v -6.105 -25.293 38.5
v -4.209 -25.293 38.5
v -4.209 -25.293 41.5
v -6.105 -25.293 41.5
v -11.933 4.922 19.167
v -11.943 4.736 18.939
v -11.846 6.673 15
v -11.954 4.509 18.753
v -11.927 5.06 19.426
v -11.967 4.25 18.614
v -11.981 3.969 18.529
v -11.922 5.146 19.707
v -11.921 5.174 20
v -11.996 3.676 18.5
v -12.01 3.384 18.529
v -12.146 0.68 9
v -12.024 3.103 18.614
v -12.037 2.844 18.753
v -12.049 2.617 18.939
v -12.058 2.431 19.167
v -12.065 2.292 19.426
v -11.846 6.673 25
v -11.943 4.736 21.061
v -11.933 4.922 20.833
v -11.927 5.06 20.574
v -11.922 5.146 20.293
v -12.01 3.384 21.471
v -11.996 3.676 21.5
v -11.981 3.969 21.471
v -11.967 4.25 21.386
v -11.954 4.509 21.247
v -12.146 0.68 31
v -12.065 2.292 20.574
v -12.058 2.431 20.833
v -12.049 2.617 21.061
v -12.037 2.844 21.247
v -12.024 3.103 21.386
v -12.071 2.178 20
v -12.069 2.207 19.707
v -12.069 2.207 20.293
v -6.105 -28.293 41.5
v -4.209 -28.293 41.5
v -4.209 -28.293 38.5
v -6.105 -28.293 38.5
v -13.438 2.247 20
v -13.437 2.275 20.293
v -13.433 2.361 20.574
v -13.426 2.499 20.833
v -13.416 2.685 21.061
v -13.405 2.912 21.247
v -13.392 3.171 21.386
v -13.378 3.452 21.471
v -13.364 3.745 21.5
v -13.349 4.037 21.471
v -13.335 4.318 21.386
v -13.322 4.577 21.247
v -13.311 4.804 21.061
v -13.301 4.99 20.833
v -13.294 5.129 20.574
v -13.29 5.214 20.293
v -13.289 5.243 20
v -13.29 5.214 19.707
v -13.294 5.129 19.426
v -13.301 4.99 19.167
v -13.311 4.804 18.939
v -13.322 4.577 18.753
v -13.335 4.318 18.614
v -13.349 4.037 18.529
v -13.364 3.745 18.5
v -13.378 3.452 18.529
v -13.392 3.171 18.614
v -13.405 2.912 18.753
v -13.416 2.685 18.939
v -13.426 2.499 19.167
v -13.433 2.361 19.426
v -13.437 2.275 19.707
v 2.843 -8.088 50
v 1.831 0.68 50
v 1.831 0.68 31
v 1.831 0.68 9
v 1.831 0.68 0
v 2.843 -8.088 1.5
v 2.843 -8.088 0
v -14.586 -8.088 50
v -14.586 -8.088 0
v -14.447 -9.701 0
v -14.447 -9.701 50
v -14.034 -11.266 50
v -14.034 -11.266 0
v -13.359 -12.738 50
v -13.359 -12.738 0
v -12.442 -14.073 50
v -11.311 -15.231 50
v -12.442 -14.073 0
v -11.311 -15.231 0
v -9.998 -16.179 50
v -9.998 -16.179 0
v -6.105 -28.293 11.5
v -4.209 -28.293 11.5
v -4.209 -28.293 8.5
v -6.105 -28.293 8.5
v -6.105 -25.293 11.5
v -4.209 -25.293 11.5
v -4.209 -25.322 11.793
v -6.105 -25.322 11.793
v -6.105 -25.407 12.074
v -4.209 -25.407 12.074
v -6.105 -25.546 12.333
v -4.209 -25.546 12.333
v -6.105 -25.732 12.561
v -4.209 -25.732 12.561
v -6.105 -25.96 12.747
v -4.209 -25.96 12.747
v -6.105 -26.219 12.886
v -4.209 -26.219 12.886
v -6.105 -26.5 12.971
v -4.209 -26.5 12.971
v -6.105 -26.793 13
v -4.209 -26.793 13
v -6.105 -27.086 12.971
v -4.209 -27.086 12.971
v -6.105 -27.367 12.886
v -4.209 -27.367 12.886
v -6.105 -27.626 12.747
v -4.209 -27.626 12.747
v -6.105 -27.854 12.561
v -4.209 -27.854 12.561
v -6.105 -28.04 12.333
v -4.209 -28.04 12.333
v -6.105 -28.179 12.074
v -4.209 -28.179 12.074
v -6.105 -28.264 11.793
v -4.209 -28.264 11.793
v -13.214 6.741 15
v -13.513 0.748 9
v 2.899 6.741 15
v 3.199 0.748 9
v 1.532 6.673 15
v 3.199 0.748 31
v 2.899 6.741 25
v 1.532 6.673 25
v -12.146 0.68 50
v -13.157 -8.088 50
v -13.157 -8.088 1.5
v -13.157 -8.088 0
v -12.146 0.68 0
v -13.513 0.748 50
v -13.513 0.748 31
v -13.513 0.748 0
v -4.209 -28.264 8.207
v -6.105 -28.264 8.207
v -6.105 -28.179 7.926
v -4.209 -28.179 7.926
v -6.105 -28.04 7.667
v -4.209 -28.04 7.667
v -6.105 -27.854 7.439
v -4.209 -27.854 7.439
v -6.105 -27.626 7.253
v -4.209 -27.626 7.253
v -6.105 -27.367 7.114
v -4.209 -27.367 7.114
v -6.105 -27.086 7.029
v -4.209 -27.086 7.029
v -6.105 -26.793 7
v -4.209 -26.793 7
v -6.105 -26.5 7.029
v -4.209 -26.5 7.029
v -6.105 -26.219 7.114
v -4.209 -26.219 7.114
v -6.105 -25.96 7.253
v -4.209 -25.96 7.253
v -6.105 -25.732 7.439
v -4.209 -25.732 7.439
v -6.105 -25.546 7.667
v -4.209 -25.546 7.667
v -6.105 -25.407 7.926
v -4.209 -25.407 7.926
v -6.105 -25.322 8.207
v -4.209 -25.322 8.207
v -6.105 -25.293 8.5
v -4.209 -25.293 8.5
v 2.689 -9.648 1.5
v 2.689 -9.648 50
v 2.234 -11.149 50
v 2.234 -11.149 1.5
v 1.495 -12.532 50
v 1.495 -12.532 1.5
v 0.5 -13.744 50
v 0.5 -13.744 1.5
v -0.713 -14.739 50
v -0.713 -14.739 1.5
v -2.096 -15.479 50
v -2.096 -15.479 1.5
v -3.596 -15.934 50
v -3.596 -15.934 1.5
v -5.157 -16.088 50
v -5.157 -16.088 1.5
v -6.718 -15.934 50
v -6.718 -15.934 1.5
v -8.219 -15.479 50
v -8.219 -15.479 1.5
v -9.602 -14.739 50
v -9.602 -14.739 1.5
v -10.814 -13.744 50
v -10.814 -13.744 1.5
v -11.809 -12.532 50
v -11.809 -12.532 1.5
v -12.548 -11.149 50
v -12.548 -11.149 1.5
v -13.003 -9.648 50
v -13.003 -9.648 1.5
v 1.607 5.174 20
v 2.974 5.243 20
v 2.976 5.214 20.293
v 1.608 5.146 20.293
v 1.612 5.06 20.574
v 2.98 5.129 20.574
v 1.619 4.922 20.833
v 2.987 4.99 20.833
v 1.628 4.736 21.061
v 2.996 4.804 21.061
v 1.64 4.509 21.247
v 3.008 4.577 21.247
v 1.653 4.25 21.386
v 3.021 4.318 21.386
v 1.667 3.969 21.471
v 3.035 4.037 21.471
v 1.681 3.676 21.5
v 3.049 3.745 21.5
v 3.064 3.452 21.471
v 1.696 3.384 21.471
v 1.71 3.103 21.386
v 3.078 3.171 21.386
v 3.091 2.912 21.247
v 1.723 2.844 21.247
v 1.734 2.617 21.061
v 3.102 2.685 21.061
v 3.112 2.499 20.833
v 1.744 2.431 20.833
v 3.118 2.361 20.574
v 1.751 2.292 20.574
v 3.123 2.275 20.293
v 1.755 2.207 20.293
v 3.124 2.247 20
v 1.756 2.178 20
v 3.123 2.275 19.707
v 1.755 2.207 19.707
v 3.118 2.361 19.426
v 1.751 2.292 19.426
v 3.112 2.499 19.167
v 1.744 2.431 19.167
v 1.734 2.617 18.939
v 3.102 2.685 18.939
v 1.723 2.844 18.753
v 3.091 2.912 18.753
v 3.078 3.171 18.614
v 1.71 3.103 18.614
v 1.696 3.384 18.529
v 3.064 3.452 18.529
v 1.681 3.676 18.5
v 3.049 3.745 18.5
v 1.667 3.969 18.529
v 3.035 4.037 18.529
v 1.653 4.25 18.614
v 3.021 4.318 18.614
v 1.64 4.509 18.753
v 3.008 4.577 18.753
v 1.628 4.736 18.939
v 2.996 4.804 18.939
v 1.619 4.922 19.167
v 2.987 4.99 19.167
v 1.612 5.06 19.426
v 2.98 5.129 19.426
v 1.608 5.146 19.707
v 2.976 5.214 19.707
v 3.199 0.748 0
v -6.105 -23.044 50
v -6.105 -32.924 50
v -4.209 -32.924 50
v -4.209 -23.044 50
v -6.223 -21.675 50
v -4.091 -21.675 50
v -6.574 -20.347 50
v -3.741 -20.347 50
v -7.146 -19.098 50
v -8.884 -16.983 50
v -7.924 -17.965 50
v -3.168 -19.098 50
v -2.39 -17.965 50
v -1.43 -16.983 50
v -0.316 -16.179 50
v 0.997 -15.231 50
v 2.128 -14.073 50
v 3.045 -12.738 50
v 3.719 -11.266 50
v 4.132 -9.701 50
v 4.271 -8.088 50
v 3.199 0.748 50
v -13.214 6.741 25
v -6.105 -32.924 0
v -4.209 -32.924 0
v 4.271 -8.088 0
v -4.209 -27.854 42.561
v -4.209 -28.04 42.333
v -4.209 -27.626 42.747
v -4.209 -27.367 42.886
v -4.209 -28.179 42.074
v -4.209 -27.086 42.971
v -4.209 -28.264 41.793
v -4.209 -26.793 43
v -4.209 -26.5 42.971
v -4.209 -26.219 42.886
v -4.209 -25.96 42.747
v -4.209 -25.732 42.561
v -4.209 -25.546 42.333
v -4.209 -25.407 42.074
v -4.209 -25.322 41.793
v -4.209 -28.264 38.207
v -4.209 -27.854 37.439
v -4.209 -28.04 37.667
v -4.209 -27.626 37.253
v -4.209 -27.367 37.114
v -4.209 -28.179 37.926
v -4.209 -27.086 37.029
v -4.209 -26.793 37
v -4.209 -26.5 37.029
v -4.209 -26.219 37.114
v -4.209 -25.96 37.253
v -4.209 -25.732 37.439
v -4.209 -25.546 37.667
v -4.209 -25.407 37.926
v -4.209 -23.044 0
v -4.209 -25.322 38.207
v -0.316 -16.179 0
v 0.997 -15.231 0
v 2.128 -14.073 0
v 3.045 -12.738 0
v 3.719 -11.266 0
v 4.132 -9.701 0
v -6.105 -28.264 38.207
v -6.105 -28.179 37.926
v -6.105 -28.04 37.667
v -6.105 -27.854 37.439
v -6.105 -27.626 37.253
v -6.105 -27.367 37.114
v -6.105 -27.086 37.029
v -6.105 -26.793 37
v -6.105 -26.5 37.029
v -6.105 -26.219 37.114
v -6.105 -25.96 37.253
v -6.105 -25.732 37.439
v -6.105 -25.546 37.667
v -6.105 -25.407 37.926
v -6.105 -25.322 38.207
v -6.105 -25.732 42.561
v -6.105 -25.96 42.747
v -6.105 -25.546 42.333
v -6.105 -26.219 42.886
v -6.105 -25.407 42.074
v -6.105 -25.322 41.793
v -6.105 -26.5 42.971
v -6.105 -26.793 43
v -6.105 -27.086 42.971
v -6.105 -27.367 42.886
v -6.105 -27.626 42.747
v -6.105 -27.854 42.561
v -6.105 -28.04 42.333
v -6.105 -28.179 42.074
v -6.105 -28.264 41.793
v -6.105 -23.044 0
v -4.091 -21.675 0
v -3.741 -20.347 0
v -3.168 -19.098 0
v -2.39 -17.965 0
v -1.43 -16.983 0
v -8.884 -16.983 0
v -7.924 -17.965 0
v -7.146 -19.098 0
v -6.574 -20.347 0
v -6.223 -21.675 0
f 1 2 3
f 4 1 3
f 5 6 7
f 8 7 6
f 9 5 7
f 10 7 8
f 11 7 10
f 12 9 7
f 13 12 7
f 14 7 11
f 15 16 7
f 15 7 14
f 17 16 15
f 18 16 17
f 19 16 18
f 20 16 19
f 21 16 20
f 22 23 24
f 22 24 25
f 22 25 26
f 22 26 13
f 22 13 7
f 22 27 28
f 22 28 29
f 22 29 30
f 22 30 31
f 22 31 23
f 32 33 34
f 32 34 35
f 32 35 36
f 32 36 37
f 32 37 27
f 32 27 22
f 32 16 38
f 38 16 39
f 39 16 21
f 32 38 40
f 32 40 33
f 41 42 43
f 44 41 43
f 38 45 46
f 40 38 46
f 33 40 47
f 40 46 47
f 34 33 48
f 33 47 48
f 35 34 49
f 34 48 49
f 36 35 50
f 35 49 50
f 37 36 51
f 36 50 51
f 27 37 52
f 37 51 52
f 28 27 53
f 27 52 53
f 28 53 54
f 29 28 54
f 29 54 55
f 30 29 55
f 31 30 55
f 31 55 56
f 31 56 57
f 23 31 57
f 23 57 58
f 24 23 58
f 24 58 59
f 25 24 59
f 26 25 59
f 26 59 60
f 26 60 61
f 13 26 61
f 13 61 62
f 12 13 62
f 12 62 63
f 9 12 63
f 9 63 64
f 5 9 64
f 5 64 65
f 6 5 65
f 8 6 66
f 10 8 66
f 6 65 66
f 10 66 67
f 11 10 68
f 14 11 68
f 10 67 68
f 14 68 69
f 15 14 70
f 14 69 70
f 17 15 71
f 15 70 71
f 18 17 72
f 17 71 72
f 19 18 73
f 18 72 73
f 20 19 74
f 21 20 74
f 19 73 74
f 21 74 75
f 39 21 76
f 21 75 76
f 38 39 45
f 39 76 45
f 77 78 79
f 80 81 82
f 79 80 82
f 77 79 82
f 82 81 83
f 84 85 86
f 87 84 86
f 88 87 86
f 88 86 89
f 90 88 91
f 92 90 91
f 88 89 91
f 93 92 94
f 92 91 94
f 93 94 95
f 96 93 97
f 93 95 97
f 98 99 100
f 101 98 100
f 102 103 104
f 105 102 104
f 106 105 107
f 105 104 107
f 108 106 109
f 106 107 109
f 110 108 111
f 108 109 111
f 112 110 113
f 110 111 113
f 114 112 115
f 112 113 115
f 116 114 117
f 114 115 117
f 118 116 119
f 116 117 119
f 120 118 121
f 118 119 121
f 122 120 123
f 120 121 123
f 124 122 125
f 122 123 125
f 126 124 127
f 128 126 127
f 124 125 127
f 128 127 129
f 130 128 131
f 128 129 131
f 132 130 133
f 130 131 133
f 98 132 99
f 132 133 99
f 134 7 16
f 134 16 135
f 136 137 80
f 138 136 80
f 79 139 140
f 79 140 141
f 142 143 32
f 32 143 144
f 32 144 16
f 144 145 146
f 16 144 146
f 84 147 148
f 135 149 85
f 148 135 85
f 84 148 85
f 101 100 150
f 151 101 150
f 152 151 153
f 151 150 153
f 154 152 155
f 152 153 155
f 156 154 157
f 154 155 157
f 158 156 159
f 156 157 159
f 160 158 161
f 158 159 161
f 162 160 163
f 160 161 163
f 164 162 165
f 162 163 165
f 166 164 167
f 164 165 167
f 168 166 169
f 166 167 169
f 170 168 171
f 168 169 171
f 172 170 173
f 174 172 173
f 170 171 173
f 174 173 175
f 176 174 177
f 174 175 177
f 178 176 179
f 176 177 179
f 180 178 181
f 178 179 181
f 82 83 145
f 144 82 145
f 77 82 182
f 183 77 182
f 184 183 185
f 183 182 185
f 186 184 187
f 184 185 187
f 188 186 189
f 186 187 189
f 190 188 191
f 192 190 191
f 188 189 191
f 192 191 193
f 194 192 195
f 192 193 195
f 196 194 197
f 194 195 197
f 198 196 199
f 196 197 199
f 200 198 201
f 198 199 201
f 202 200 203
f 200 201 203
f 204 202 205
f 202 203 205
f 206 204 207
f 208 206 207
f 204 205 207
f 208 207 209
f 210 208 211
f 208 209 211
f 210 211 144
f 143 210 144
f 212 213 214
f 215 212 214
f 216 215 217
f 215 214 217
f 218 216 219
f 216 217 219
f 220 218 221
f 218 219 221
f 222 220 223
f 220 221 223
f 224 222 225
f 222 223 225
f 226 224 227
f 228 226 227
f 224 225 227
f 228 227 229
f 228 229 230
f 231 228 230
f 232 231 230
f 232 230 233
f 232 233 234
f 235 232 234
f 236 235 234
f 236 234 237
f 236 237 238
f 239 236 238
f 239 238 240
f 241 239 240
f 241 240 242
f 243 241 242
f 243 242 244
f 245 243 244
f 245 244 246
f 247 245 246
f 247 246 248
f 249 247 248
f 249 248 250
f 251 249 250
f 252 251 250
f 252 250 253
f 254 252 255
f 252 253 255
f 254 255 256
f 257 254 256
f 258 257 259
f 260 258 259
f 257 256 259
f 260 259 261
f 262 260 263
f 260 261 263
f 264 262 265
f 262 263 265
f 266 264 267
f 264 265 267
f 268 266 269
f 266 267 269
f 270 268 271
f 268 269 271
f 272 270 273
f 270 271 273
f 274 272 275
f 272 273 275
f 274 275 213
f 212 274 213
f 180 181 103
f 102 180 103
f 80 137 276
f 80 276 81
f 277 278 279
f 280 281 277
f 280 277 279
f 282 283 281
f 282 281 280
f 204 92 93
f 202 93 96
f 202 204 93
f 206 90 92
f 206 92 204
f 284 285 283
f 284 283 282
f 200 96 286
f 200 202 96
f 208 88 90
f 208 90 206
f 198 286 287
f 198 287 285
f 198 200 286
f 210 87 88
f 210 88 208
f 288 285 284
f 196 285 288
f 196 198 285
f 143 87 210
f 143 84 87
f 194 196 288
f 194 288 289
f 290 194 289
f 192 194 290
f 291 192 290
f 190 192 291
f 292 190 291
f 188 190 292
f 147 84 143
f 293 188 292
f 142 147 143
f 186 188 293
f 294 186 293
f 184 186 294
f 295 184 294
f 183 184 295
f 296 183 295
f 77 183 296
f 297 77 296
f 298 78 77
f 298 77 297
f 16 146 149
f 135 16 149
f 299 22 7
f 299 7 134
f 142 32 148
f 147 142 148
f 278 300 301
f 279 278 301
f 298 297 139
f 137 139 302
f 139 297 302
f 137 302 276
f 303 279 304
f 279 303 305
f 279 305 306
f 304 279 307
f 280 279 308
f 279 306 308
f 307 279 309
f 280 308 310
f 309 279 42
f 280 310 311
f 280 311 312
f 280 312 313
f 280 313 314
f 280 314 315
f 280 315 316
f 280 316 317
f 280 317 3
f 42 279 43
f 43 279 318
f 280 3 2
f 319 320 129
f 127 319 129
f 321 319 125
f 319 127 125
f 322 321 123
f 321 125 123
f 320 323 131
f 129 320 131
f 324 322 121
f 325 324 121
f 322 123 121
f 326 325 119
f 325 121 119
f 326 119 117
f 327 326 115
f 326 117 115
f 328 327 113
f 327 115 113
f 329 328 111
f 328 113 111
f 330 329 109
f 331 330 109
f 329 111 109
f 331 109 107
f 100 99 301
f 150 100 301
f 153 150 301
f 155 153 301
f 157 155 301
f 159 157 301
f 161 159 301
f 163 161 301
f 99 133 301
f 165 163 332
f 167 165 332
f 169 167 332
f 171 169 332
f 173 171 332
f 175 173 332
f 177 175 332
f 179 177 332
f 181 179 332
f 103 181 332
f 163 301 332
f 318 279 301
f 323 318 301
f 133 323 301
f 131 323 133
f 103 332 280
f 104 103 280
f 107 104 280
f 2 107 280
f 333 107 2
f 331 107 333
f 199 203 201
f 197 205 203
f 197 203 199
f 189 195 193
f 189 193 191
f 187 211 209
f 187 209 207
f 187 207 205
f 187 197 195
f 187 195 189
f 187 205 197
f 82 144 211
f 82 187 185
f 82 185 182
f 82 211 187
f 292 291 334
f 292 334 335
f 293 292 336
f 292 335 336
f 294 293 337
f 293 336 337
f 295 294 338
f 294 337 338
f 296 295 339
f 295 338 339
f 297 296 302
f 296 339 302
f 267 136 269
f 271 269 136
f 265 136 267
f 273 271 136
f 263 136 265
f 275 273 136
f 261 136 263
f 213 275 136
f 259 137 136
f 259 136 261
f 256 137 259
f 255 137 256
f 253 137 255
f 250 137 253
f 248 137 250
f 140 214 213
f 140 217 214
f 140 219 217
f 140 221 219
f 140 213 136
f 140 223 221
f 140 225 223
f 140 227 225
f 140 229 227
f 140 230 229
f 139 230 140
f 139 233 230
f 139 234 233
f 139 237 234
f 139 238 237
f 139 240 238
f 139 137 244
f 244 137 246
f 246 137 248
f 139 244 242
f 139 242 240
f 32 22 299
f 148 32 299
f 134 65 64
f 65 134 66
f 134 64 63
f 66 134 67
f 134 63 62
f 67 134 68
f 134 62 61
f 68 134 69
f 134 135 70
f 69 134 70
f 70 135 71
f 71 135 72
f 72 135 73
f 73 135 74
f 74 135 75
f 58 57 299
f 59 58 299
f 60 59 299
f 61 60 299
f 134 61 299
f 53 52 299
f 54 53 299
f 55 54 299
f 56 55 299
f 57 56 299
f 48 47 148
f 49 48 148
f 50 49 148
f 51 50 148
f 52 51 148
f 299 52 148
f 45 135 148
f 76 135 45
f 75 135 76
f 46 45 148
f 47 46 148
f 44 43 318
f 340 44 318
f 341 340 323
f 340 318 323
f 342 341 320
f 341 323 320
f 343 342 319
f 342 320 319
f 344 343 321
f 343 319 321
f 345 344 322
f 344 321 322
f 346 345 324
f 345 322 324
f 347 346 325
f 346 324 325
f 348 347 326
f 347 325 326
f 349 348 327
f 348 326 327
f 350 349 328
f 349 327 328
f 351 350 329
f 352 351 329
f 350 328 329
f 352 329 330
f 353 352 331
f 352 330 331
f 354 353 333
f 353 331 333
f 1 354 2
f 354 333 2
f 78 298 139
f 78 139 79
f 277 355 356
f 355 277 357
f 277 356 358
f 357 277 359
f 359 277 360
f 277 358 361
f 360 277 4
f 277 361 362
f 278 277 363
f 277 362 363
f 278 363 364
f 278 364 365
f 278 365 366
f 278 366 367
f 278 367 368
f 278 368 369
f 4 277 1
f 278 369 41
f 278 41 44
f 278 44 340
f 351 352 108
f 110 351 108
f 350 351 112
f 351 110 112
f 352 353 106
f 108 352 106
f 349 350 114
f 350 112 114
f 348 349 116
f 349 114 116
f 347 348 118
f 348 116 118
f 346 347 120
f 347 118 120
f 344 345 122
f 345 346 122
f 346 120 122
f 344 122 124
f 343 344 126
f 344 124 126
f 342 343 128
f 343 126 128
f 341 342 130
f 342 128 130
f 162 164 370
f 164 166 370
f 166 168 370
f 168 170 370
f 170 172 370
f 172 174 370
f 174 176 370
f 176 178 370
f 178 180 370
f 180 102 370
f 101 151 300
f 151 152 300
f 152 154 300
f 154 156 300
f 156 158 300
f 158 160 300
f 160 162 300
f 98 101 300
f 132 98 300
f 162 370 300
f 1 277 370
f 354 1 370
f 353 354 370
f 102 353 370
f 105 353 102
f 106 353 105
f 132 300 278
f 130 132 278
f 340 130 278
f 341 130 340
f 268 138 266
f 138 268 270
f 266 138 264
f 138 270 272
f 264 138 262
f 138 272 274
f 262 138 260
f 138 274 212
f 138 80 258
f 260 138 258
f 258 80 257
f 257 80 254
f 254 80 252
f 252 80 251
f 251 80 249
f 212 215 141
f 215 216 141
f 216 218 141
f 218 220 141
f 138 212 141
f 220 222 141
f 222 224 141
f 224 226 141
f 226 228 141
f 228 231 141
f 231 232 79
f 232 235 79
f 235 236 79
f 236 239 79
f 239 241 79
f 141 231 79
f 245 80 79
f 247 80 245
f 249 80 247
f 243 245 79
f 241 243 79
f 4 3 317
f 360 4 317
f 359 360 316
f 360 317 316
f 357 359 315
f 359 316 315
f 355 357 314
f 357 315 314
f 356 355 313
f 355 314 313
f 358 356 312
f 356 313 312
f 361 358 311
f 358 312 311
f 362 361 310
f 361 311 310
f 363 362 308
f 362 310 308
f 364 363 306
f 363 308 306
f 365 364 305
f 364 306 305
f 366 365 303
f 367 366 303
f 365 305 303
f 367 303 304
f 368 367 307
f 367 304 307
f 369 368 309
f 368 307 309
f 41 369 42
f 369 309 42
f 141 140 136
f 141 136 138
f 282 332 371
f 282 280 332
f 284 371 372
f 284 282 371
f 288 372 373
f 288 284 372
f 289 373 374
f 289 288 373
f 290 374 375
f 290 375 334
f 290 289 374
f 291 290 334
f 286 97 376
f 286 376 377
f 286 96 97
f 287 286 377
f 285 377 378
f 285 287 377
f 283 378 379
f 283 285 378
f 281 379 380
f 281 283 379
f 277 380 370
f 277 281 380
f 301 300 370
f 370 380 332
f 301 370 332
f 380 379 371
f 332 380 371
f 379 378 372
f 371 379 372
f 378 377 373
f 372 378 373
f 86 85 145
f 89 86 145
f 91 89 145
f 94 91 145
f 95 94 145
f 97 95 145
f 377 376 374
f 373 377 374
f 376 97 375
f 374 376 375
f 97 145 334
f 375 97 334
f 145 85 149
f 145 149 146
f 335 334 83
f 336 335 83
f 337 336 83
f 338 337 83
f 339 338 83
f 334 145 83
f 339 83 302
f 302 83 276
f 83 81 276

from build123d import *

# Parameters (mm, degrees)
F1_DEPTH  = 1.5
F2_DEPTH  = 50
F3_R      = 8
F4_W      = 1.3695214008
F4_H      = 10
F6_DEPTH  = 6
F5_W      = 1.3695214008
F5_H      = 10
F7_DEPTH  = 6
F8_R      = 1.5
F9_DEPTH  = 2
F10_R     = 1.5
F11_DEPTH = 2
F12_SIZE  = 5.99999
F14_DEPTH = 3


# Not quite as in the source:
# - a fillet or chamfer is up to 0.001 mm smaller than in the source, because OpenCascade refuses the exact size


with BuildPart() as f1:
    # F0 (on Top) → F1 (new body)
    with BuildSketch(Plane.XY):
        with BuildLine():
            Line((-8.8714406544, -8.0876392549), (-13.1571549401, -8.0876392549))
            ThreePointArc((-13.1571549401, -8.0876392549), (-5.1571549401, -16.0876392549), (2.8428450599, -8.0876392549))
            Line((2.8428450599, -8.0876392549), (-1.4428692258, -8.0876392549))
            Line((-1.4428692258, -8.0876392549), (-8.8714406544, -8.0876392549))
        make_face()
    extrude(amount=F1_DEPTH)

    # F0 (on Top) → F2 (join)
    with BuildSketch(Plane.XY):
        with BuildLine():
            ThreePointArc((2.8428450599, -8.0876392549), (-5.1571549401, -16.0876392549), (-13.1571549401, -8.0876392549))
            Line((-13.1571549401, -8.0876392549), (-12.1455313702, 0.680061955))
            Line((-12.1455313702, 0.680061955), (-13.5133440803, 0.7484524309))
            Line((-13.5133440803, 0.7484524309), (-14.5857263686, -8.0876392549))
            ThreePointArc((-14.5857263686, -8.0876392549), (-12.1513540266, -14.4105450997), (-6.1053030882, -17.4684161029))
            Line((-6.1053030882, -17.4684161029), (-6.1053030882, -32.9236180908))
            Line((-6.1053030882, -32.9236180908), (-4.2090067919, -32.9236180908))
            Line((-4.2090067919, -32.9236180908), (-4.2090067919, -17.4684161029))
            ThreePointArc((-4.2090067919, -17.4684161029), (1.8370441464, -14.4105450997), (4.2714164885, -8.0876392549))
            Line((4.2714164885, -8.0876392549), (3.1990342002, 0.7484524309))
            Line((3.1990342002, 0.7484524309), (1.83122149, 0.680061955))
            Line((1.83122149, 0.680061955), (2.8428450599, -8.0876392549))
        make_face()
    extrude(amount=F2_DEPTH)

    # F3
    f3_edges = [f1.edges().sort_by_distance(p)[0] for p in [
        (-6.105303, -17.468416, 25),
        (-4.209007, -17.468416, 25),
    ]]
    fillet(f3_edges, radius=F3_R)

    # F4 (on face) → F6 (join)
    with BuildSketch(Plane(origin=(-0.0293516073, 0.5870335173, 0), x_dir=(-0.9987523447, -0.0499375007, 0), z_dir=(-0.0499375007, 0.9987523447, 0))):
        with Locations((-2.5476580515, 20)):
            Rectangle(F4_W, F4_H)
    extrude(amount=F6_DEPTH)

    # F5 (on face) → F7 (join)
    with BuildSketch(Plane(origin=(0.0036302561, 0.0726052918, 0), x_dir=(-0.9987523447, 0.0499375007, 0), z_dir=(0.0499375007, 0.9987523447, 0))):
        with Locations((12.8490992282, 20)):
            Rectangle(F5_W, F5_H)
    extrude(amount=F7_DEPTH)

    # F8 (on face) → F9 (cut)
    with BuildSketch(Plane(origin=(3.2283858075, 0.1614189135, 0), x_dir=(-0.0499375007, 0.9987523447, 0), z_dir=(0.9987523447, 0.0499375007, 0))):
        with Locations((3.5877668478, 20)):
            Circle(F8_R)
    extrude(amount=-F9_DEPTH, mode=Mode.SUBTRACT)

    # F10 (on face) → F11 (cut)
    with BuildSketch(Plane(origin=(-13.5169743364, 0.6758471391, 0), x_dir=(-0.0499375007, -0.9987523447, 0), z_dir=(-0.9987523447, 0.0499375007, 0))):
        with Locations((-3.0726959913, 20)):
            Circle(F10_R)
    extrude(amount=-F11_DEPTH, mode=Mode.SUBTRACT)

    # F12 (size 6 in the source; OpenCascade refuses exactly that, so slightly less here)
    f12_edges = [f1.edges().sort_by_distance(p)[0] for p in [
        (2.515128, 0.714257, 15),
        (-12.829438, 0.714257, 15),
        (2.515128, 0.714257, 25),
        (-12.829438, 0.714257, 25),
    ]]
    chamfer(f12_edges, length=F12_SIZE)

    # F13 (on face) → F14 (cut)
    with BuildSketch(Plane.YZ.offset(-4.2090067919)):
        with BuildLine():
            ThreePointArc((-28.2929875813, 38.5), (-26.7929875813, 37), (-25.2929875813, 38.5))
            Line((-25.2929875813, 38.5), (-25.2929875813, 41.5))
            ThreePointArc((-25.2929875813, 41.5), (-26.7929875813, 43), (-28.2929875813, 41.5))
            Line((-28.2929875813, 41.5), (-28.2929875813, 38.5))
        make_face()
        with BuildLine():
            ThreePointArc((-28.2929875813, 8.5), (-26.7929875813, 7), (-25.2929875813, 8.5))
            Line((-25.2929875813, 8.5), (-25.2929875813, 11.5))
            ThreePointArc((-25.2929875813, 11.5), (-26.7929875813, 13), (-28.2929875813, 11.5))
            Line((-28.2929875813, 11.5), (-28.2929875813, 8.5))
        make_face()
    extrude(amount=-F14_DEPTH, mode=Mode.SUBTRACT)


solid = f1.part
